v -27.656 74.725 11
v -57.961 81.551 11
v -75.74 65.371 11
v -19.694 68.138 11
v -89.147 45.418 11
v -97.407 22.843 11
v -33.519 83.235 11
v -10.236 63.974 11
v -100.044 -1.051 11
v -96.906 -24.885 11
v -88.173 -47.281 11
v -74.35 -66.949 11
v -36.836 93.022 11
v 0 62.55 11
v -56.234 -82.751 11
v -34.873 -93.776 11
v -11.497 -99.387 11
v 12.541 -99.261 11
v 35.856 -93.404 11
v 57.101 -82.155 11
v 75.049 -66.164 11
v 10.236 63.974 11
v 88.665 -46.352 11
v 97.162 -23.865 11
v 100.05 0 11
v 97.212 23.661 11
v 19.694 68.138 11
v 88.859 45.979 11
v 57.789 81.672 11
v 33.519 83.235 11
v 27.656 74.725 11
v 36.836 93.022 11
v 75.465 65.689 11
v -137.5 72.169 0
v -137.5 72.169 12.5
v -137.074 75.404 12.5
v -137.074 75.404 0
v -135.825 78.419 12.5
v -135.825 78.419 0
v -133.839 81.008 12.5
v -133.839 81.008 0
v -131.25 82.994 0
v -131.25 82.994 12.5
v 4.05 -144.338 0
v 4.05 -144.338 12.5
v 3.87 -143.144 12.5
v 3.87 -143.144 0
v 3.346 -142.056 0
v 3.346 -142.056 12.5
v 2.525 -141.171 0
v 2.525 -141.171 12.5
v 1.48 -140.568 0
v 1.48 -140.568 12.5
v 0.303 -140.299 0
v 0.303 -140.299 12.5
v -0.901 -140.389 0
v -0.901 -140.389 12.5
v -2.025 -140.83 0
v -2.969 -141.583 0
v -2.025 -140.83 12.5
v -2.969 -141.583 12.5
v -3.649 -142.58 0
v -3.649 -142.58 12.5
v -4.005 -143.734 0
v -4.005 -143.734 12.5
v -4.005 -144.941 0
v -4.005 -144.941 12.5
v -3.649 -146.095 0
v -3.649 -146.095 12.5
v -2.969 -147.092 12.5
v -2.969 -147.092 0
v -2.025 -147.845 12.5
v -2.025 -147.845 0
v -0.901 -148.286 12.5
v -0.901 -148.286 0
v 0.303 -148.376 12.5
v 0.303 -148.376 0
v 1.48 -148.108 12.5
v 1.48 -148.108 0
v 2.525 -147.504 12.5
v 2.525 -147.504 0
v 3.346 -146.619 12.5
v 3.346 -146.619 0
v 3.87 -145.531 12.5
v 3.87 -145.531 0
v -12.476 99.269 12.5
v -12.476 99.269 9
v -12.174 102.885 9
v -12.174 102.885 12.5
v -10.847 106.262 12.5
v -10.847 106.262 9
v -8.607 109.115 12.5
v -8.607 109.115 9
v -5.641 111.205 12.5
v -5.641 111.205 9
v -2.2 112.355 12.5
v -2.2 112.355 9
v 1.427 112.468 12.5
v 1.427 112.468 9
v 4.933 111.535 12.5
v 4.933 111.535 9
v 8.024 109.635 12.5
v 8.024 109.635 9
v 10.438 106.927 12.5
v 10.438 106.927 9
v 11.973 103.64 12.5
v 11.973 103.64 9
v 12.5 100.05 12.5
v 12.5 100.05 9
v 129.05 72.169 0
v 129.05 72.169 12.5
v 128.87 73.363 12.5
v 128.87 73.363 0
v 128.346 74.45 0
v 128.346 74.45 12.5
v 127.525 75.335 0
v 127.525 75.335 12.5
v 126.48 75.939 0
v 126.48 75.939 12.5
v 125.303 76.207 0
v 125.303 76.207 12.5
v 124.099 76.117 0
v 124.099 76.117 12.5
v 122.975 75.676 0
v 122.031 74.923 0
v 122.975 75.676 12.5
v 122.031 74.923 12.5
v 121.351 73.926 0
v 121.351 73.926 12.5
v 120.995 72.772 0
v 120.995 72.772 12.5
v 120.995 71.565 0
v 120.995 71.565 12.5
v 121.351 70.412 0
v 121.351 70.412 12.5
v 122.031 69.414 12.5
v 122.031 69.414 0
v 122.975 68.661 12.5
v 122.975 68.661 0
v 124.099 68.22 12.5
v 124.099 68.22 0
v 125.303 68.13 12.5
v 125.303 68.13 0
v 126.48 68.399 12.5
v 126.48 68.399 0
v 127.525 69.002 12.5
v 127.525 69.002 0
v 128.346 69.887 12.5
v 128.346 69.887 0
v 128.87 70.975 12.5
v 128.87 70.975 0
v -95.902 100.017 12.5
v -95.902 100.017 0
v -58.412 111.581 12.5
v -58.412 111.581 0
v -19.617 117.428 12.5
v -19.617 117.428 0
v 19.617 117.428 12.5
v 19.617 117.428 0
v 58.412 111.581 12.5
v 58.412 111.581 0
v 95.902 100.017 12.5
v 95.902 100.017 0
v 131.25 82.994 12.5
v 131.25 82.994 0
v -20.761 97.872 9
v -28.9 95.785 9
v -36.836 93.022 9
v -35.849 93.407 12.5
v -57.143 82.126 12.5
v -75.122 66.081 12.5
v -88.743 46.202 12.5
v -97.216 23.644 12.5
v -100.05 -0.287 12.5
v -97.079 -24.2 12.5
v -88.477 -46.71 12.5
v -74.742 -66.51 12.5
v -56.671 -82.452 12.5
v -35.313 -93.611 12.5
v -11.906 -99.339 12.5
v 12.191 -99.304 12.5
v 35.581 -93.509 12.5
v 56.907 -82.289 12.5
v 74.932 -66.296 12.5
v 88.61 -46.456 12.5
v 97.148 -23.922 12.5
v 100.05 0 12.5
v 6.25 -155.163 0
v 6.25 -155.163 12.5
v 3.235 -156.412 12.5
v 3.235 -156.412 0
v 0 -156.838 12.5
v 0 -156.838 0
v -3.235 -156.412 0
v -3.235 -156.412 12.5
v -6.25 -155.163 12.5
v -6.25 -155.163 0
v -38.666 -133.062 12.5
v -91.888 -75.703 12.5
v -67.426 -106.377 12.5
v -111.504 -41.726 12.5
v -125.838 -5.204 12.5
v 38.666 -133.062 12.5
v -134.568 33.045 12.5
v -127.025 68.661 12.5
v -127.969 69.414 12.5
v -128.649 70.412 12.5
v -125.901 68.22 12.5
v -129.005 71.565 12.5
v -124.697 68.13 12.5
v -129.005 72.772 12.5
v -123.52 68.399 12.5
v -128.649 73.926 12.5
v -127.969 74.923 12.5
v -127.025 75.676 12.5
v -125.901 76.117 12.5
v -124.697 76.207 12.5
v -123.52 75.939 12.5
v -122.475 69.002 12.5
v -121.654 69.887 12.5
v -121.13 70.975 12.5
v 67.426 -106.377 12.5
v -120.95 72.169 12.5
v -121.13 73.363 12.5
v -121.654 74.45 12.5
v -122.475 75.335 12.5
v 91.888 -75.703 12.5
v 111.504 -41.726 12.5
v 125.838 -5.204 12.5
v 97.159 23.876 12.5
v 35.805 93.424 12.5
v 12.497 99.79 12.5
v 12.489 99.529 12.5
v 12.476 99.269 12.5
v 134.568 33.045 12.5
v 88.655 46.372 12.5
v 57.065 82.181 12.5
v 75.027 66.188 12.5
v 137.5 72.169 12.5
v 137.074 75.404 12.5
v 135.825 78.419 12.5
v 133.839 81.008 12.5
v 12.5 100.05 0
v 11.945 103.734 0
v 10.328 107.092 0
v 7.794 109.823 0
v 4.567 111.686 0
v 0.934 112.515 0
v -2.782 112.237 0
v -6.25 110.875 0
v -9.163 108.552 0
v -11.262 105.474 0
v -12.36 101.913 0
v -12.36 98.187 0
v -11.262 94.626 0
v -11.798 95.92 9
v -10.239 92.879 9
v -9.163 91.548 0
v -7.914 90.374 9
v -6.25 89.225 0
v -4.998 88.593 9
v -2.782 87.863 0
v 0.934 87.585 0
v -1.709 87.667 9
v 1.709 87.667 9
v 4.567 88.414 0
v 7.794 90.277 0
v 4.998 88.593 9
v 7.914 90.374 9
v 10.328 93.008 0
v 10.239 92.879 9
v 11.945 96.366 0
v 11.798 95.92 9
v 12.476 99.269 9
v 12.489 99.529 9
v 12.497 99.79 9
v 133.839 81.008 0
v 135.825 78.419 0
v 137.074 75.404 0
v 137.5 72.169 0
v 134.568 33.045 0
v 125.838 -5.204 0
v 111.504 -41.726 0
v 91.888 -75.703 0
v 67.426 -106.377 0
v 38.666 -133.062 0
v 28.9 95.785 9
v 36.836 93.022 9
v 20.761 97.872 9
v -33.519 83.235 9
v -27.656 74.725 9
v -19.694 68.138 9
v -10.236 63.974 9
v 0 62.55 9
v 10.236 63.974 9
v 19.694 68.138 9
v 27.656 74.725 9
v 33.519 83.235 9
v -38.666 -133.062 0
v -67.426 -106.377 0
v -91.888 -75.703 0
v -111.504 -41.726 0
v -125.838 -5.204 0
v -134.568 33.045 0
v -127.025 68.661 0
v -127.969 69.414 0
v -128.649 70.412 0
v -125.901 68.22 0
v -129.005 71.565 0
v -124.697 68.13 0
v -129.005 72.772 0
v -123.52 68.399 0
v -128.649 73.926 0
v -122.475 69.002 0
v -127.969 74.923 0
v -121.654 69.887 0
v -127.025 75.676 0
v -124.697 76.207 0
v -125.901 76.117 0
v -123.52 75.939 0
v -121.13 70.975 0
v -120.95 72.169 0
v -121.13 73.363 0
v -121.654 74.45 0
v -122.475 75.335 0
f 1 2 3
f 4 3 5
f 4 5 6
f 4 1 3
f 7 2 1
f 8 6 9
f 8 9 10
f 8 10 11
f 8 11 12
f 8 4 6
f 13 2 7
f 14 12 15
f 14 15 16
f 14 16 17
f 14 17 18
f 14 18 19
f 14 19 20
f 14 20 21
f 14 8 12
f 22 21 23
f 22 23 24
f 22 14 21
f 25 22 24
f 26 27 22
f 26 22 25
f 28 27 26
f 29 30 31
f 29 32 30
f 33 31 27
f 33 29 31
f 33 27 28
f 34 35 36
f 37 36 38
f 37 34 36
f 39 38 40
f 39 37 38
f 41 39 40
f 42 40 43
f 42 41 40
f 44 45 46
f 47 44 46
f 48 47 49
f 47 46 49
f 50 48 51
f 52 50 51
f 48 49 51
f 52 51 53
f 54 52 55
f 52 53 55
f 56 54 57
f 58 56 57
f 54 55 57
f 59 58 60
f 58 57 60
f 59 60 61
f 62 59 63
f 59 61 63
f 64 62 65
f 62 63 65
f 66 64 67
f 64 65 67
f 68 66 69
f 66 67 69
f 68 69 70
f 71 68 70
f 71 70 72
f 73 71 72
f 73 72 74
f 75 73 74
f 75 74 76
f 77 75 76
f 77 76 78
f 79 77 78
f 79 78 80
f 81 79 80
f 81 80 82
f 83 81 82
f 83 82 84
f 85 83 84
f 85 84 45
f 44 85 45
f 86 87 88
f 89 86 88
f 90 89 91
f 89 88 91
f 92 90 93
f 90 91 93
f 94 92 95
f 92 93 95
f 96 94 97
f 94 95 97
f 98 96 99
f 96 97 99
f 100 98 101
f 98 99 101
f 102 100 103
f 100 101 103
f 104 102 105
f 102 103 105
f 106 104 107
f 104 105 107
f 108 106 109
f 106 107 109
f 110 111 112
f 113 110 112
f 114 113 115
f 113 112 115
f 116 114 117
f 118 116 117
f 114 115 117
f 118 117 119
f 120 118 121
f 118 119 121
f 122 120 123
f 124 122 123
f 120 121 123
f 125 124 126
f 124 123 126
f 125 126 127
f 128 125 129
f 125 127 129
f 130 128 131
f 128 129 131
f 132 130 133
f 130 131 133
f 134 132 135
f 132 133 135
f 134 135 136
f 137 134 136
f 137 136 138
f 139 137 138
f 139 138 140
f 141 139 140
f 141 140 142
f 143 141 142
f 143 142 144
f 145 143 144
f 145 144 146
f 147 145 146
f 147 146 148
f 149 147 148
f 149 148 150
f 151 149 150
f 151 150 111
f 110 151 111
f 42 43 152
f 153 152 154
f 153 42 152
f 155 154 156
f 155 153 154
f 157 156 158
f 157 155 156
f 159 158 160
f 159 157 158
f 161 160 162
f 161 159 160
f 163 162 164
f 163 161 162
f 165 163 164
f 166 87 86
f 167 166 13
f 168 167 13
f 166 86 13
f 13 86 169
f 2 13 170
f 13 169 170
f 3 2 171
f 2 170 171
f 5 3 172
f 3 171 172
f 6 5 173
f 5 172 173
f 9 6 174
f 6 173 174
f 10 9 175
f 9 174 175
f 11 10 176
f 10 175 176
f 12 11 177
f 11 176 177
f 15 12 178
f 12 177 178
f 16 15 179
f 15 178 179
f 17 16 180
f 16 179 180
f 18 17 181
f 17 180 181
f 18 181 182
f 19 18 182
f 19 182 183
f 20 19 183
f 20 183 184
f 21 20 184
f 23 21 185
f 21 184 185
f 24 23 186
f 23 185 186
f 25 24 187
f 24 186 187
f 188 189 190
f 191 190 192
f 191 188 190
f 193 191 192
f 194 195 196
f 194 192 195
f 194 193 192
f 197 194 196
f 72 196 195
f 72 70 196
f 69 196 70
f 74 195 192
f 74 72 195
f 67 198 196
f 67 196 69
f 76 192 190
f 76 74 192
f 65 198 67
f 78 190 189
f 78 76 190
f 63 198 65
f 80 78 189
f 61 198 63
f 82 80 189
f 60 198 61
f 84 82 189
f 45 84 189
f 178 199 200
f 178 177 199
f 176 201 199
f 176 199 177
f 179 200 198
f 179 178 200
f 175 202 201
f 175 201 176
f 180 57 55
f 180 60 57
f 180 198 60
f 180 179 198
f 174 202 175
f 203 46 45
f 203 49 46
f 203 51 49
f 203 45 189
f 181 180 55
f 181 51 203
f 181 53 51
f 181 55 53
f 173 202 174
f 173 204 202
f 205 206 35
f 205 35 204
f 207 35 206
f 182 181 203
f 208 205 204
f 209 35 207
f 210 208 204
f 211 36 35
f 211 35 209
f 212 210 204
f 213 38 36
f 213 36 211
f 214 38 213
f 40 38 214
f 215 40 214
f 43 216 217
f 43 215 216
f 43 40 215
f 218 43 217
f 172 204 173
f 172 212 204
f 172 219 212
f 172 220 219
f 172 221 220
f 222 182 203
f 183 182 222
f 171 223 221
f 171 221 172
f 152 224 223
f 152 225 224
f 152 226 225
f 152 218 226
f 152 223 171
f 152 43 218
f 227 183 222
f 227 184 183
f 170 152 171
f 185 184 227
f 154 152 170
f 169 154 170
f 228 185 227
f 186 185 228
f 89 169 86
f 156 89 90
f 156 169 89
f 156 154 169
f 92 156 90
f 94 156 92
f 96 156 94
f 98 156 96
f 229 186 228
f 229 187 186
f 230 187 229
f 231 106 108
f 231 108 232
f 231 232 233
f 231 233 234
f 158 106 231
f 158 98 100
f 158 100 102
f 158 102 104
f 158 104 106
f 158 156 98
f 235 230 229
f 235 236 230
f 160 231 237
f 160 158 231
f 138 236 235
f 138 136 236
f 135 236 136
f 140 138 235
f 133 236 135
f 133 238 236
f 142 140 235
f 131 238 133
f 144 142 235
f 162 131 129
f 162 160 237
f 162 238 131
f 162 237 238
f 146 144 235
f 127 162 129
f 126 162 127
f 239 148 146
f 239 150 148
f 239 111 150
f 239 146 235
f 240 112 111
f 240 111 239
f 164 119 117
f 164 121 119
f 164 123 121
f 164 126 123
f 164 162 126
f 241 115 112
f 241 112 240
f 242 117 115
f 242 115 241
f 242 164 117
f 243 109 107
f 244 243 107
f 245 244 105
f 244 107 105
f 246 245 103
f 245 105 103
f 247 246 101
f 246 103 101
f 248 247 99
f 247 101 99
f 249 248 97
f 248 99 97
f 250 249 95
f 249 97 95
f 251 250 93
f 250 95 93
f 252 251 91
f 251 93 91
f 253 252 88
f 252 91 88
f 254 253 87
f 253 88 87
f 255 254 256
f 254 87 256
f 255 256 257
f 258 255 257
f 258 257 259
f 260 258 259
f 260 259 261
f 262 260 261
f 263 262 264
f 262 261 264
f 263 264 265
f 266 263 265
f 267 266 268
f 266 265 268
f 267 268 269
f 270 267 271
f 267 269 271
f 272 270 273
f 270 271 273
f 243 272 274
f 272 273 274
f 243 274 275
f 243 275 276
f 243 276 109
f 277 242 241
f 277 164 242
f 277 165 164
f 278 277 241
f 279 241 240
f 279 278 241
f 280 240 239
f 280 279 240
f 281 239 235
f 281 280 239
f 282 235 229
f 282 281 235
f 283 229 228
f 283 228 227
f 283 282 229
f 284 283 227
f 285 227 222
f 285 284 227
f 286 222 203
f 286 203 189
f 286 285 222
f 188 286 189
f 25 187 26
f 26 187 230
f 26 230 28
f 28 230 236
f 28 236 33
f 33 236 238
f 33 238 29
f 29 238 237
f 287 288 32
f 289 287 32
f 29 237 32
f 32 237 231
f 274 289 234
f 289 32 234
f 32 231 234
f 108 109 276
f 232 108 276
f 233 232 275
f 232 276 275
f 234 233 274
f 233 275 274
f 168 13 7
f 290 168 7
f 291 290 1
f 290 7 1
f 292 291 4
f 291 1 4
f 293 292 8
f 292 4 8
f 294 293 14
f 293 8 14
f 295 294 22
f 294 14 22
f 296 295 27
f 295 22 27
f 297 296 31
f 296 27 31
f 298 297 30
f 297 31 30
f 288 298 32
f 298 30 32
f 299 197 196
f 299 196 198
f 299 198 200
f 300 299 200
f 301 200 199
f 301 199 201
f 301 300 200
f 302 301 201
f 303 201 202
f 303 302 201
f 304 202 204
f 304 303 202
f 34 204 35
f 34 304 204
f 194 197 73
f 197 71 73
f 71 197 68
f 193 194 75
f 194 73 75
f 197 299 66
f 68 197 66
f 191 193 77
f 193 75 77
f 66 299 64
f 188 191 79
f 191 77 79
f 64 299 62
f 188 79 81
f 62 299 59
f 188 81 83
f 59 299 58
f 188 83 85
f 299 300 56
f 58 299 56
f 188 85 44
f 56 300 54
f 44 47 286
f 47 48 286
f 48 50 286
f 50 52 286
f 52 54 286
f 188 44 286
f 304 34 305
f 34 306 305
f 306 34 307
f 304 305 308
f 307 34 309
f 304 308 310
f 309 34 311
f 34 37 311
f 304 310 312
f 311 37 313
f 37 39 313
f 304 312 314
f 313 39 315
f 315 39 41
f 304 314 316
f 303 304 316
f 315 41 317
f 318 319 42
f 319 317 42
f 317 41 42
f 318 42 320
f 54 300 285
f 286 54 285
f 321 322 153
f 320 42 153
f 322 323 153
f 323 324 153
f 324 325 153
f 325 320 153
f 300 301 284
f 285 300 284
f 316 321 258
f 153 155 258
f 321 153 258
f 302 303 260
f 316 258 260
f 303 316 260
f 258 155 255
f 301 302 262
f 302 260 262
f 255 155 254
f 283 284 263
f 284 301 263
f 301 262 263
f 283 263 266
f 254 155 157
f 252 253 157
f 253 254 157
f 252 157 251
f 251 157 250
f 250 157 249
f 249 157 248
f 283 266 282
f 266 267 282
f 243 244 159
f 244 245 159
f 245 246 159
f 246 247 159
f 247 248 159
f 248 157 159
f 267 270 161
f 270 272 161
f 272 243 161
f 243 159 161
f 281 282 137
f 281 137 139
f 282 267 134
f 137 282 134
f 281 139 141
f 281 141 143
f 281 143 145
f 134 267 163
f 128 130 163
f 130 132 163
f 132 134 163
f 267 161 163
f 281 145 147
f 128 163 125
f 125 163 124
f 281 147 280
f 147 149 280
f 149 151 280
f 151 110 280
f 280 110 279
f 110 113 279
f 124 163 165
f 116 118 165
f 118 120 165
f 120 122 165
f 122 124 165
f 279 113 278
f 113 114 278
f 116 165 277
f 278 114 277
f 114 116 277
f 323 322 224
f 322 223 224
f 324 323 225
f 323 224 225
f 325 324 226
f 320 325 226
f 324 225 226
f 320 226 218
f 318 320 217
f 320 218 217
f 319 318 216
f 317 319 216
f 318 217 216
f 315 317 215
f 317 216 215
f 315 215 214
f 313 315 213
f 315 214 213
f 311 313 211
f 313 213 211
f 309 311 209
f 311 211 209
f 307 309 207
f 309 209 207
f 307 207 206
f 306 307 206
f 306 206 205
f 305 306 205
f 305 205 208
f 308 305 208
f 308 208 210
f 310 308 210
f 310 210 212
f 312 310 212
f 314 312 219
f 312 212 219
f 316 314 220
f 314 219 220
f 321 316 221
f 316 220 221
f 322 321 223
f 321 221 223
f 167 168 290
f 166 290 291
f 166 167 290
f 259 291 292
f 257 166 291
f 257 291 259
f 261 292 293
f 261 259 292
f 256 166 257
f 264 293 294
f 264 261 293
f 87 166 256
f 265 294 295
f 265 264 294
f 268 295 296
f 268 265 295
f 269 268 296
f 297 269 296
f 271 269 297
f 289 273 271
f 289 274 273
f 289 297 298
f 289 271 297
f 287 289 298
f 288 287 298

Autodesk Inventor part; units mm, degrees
ref_plane "YZ Plane" through (0, 0, 0) normal (1, 0, 0) x (0, 1, 0)
ref_plane "XZ Plane" through (0, 0, 0) normal (0, 1, 0) x (-1, 0, 0)
ref_plane "XY Plane" through (0, 0, 0) normal (0, 0, 1) x (1, 0, 0)
sketch "Sketch1" plane through (0, 0, 0) normal (0, 0, 1) x (1, 0, 0)
  arc A0 (0, -144.3376) -> (125, 72.1688) centre (-125, 72.1688) ccw
  arc A1 (-125, 72.1688) -> (0, -144.3376) centre (125, 72.1688) ccw
  arc A2 (125, 72.1688) -> (-125, 72.1688) centre (0, -144.3376) ccw
  line L0 (-125, 72.1688) -> (0, 0) construction
  line L1 (0, 0) -> (125, 72.1688) construction
  line L2 (0, 0) -> (0, -144.3376) construction
  circle A3 centre (0, 0) radius 100
  arc A4 (-131.25, 82.9941) -> (-137.5, 72.1688) centre (-125, 72.1688) ccw
  arc A5 (137.5, 72.1688) -> (131.25, 82.9941) centre (125, 72.1688) ccw
  arc A6 (-6.25, -155.1629) -> (6.25, -155.1629) centre (0, -144.3376) ccw
  arc A7 (-137.5, 72.1688) -> (-6.25, -155.1629) centre (125, 72.1688) ccw
  arc A8 (131.25, 82.9941) -> (-131.25, 82.9941) centre (0, -144.3376) ccw
  arc A9 (6.25, -155.1629) -> (137.5, 72.1688) centre (-125, 72.1688) ccw
  line L3 (-100, 100) -> (100, 100)
  line L4 (100, 100) -> (100, -100)
  line L5 (100, -100) -> (-100, -100)
  line L6 (-100, -100) -> (-100, 100)
  point P0 (0, 0)
  point P1 (0, 0)
  dimension "d0" = 200
  dimension "d2" = 250
  dimension "d3" = 12.5
extrude "Extrusion1" add sketch "Sketch1" along normal blind 12.5 contours A1 L5 A0 | A0 L5 A9 A6 A7 A1 | L5 A3 L4 A0 | A0 L4 A9 L5 | L5 A7 L6 A1 | A1 L6 A3 L5 | L4 A2 A0 | A0 A2 L4 A8 A5 A9 | A3 | L6 A7 A4 A8 A2 A1 | A1 A2 L6 | A3 L3 A2 L4 | L6 A2 L3 A3 | A2 L3 A8 L4 | L3 A2 | L6 A8 L3 A2 | A2 L3 A8
sketch "Sketch2" plane through (0, 0, 12.5) normal (0, 0, 1) x (1, 0, 0)
  arc A0 (131.25, 82.9941) -> (-131.25, 82.9941) centre (0, -144.3376) ccw projected
  arc A1 (-131.25, 82.9941) -> (-137.5, 72.1688) centre (-125, 72.1688) ccw projected
  arc A2 (-137.5, 72.1688) -> (-6.25, -155.1629) centre (125, 72.1688) ccw projected
  circle A3 centre (-125, 72.1688) radius 4.05
  circle A4 centre (125, 72.1688) radius 4.05
  circle A5 centre (0, -144.3376) radius 4.05
  point P0 (0, 0)
  dimension "d6" = 8.1
extrude "Extrusion2" cut sketch "Sketch2" against normal through all
sketch "Sketch3" plane through (0, 0, 12.5) normal (0, 0, 1) x (1, 0, 0)
  circle A0 centre (0, 0) radius 100.05
  dimension "d10" = 200.1
extrude "Extrusion3" cut sketch "Sketch3" against normal blind 1.5
sketch "Sketch5" plane through (0, 0, 12.5) normal (0, 0, 1) x (1, 0, 0)
  circle A0 centre (125, 72.1688) radius 4.05 projected
  circle A1 centre (-125, 72.1688) radius 4.05 projected
  circle A2 centre (0, -144.3376) radius 4.05 projected
hole "Hole1" at (0, -144.3376, 12.5) at (-125, 72.1688, 12.5) at (125, 72.1688, 12.5) direction (0, 0, -1) diameter 8.1 end through all clearance for "Socket Head Cap Screw" size "M8" standard "Ansi Metric M Profile"
sketch "Sketch7" plane through (0, 0, 11) normal (0, 0, 1) x (1, 0, 0)
  circle A0 centre (0, 0) radius 100.05 projected
  arc A1 (-36.8356, 93.0223) -> (36.8356, 93.0223) centre (0, 100.05) ccw
  dimension "d30" = 37.5
extrude "Extrusion5" cut sketch "Sketch7" against normal blind 2 contours A1 A0 picked at (-7.0348, 87.6172)
sketch "Sketch9" plane through (0, 0, 9) normal (0, 0, 1) x (1, 0, 0)
  arc A0 (-36.8356, 93.0223) -> (36.8356, 93.0223) centre (0, 100.05) ccw projected
  circle A1 centre (0, 100.05) radius 12.5
  dimension "d39" = 25
extrude "Extrusion7" cut sketch "Sketch9" along normal through all both and the other way through all
properties part number "build plate"
